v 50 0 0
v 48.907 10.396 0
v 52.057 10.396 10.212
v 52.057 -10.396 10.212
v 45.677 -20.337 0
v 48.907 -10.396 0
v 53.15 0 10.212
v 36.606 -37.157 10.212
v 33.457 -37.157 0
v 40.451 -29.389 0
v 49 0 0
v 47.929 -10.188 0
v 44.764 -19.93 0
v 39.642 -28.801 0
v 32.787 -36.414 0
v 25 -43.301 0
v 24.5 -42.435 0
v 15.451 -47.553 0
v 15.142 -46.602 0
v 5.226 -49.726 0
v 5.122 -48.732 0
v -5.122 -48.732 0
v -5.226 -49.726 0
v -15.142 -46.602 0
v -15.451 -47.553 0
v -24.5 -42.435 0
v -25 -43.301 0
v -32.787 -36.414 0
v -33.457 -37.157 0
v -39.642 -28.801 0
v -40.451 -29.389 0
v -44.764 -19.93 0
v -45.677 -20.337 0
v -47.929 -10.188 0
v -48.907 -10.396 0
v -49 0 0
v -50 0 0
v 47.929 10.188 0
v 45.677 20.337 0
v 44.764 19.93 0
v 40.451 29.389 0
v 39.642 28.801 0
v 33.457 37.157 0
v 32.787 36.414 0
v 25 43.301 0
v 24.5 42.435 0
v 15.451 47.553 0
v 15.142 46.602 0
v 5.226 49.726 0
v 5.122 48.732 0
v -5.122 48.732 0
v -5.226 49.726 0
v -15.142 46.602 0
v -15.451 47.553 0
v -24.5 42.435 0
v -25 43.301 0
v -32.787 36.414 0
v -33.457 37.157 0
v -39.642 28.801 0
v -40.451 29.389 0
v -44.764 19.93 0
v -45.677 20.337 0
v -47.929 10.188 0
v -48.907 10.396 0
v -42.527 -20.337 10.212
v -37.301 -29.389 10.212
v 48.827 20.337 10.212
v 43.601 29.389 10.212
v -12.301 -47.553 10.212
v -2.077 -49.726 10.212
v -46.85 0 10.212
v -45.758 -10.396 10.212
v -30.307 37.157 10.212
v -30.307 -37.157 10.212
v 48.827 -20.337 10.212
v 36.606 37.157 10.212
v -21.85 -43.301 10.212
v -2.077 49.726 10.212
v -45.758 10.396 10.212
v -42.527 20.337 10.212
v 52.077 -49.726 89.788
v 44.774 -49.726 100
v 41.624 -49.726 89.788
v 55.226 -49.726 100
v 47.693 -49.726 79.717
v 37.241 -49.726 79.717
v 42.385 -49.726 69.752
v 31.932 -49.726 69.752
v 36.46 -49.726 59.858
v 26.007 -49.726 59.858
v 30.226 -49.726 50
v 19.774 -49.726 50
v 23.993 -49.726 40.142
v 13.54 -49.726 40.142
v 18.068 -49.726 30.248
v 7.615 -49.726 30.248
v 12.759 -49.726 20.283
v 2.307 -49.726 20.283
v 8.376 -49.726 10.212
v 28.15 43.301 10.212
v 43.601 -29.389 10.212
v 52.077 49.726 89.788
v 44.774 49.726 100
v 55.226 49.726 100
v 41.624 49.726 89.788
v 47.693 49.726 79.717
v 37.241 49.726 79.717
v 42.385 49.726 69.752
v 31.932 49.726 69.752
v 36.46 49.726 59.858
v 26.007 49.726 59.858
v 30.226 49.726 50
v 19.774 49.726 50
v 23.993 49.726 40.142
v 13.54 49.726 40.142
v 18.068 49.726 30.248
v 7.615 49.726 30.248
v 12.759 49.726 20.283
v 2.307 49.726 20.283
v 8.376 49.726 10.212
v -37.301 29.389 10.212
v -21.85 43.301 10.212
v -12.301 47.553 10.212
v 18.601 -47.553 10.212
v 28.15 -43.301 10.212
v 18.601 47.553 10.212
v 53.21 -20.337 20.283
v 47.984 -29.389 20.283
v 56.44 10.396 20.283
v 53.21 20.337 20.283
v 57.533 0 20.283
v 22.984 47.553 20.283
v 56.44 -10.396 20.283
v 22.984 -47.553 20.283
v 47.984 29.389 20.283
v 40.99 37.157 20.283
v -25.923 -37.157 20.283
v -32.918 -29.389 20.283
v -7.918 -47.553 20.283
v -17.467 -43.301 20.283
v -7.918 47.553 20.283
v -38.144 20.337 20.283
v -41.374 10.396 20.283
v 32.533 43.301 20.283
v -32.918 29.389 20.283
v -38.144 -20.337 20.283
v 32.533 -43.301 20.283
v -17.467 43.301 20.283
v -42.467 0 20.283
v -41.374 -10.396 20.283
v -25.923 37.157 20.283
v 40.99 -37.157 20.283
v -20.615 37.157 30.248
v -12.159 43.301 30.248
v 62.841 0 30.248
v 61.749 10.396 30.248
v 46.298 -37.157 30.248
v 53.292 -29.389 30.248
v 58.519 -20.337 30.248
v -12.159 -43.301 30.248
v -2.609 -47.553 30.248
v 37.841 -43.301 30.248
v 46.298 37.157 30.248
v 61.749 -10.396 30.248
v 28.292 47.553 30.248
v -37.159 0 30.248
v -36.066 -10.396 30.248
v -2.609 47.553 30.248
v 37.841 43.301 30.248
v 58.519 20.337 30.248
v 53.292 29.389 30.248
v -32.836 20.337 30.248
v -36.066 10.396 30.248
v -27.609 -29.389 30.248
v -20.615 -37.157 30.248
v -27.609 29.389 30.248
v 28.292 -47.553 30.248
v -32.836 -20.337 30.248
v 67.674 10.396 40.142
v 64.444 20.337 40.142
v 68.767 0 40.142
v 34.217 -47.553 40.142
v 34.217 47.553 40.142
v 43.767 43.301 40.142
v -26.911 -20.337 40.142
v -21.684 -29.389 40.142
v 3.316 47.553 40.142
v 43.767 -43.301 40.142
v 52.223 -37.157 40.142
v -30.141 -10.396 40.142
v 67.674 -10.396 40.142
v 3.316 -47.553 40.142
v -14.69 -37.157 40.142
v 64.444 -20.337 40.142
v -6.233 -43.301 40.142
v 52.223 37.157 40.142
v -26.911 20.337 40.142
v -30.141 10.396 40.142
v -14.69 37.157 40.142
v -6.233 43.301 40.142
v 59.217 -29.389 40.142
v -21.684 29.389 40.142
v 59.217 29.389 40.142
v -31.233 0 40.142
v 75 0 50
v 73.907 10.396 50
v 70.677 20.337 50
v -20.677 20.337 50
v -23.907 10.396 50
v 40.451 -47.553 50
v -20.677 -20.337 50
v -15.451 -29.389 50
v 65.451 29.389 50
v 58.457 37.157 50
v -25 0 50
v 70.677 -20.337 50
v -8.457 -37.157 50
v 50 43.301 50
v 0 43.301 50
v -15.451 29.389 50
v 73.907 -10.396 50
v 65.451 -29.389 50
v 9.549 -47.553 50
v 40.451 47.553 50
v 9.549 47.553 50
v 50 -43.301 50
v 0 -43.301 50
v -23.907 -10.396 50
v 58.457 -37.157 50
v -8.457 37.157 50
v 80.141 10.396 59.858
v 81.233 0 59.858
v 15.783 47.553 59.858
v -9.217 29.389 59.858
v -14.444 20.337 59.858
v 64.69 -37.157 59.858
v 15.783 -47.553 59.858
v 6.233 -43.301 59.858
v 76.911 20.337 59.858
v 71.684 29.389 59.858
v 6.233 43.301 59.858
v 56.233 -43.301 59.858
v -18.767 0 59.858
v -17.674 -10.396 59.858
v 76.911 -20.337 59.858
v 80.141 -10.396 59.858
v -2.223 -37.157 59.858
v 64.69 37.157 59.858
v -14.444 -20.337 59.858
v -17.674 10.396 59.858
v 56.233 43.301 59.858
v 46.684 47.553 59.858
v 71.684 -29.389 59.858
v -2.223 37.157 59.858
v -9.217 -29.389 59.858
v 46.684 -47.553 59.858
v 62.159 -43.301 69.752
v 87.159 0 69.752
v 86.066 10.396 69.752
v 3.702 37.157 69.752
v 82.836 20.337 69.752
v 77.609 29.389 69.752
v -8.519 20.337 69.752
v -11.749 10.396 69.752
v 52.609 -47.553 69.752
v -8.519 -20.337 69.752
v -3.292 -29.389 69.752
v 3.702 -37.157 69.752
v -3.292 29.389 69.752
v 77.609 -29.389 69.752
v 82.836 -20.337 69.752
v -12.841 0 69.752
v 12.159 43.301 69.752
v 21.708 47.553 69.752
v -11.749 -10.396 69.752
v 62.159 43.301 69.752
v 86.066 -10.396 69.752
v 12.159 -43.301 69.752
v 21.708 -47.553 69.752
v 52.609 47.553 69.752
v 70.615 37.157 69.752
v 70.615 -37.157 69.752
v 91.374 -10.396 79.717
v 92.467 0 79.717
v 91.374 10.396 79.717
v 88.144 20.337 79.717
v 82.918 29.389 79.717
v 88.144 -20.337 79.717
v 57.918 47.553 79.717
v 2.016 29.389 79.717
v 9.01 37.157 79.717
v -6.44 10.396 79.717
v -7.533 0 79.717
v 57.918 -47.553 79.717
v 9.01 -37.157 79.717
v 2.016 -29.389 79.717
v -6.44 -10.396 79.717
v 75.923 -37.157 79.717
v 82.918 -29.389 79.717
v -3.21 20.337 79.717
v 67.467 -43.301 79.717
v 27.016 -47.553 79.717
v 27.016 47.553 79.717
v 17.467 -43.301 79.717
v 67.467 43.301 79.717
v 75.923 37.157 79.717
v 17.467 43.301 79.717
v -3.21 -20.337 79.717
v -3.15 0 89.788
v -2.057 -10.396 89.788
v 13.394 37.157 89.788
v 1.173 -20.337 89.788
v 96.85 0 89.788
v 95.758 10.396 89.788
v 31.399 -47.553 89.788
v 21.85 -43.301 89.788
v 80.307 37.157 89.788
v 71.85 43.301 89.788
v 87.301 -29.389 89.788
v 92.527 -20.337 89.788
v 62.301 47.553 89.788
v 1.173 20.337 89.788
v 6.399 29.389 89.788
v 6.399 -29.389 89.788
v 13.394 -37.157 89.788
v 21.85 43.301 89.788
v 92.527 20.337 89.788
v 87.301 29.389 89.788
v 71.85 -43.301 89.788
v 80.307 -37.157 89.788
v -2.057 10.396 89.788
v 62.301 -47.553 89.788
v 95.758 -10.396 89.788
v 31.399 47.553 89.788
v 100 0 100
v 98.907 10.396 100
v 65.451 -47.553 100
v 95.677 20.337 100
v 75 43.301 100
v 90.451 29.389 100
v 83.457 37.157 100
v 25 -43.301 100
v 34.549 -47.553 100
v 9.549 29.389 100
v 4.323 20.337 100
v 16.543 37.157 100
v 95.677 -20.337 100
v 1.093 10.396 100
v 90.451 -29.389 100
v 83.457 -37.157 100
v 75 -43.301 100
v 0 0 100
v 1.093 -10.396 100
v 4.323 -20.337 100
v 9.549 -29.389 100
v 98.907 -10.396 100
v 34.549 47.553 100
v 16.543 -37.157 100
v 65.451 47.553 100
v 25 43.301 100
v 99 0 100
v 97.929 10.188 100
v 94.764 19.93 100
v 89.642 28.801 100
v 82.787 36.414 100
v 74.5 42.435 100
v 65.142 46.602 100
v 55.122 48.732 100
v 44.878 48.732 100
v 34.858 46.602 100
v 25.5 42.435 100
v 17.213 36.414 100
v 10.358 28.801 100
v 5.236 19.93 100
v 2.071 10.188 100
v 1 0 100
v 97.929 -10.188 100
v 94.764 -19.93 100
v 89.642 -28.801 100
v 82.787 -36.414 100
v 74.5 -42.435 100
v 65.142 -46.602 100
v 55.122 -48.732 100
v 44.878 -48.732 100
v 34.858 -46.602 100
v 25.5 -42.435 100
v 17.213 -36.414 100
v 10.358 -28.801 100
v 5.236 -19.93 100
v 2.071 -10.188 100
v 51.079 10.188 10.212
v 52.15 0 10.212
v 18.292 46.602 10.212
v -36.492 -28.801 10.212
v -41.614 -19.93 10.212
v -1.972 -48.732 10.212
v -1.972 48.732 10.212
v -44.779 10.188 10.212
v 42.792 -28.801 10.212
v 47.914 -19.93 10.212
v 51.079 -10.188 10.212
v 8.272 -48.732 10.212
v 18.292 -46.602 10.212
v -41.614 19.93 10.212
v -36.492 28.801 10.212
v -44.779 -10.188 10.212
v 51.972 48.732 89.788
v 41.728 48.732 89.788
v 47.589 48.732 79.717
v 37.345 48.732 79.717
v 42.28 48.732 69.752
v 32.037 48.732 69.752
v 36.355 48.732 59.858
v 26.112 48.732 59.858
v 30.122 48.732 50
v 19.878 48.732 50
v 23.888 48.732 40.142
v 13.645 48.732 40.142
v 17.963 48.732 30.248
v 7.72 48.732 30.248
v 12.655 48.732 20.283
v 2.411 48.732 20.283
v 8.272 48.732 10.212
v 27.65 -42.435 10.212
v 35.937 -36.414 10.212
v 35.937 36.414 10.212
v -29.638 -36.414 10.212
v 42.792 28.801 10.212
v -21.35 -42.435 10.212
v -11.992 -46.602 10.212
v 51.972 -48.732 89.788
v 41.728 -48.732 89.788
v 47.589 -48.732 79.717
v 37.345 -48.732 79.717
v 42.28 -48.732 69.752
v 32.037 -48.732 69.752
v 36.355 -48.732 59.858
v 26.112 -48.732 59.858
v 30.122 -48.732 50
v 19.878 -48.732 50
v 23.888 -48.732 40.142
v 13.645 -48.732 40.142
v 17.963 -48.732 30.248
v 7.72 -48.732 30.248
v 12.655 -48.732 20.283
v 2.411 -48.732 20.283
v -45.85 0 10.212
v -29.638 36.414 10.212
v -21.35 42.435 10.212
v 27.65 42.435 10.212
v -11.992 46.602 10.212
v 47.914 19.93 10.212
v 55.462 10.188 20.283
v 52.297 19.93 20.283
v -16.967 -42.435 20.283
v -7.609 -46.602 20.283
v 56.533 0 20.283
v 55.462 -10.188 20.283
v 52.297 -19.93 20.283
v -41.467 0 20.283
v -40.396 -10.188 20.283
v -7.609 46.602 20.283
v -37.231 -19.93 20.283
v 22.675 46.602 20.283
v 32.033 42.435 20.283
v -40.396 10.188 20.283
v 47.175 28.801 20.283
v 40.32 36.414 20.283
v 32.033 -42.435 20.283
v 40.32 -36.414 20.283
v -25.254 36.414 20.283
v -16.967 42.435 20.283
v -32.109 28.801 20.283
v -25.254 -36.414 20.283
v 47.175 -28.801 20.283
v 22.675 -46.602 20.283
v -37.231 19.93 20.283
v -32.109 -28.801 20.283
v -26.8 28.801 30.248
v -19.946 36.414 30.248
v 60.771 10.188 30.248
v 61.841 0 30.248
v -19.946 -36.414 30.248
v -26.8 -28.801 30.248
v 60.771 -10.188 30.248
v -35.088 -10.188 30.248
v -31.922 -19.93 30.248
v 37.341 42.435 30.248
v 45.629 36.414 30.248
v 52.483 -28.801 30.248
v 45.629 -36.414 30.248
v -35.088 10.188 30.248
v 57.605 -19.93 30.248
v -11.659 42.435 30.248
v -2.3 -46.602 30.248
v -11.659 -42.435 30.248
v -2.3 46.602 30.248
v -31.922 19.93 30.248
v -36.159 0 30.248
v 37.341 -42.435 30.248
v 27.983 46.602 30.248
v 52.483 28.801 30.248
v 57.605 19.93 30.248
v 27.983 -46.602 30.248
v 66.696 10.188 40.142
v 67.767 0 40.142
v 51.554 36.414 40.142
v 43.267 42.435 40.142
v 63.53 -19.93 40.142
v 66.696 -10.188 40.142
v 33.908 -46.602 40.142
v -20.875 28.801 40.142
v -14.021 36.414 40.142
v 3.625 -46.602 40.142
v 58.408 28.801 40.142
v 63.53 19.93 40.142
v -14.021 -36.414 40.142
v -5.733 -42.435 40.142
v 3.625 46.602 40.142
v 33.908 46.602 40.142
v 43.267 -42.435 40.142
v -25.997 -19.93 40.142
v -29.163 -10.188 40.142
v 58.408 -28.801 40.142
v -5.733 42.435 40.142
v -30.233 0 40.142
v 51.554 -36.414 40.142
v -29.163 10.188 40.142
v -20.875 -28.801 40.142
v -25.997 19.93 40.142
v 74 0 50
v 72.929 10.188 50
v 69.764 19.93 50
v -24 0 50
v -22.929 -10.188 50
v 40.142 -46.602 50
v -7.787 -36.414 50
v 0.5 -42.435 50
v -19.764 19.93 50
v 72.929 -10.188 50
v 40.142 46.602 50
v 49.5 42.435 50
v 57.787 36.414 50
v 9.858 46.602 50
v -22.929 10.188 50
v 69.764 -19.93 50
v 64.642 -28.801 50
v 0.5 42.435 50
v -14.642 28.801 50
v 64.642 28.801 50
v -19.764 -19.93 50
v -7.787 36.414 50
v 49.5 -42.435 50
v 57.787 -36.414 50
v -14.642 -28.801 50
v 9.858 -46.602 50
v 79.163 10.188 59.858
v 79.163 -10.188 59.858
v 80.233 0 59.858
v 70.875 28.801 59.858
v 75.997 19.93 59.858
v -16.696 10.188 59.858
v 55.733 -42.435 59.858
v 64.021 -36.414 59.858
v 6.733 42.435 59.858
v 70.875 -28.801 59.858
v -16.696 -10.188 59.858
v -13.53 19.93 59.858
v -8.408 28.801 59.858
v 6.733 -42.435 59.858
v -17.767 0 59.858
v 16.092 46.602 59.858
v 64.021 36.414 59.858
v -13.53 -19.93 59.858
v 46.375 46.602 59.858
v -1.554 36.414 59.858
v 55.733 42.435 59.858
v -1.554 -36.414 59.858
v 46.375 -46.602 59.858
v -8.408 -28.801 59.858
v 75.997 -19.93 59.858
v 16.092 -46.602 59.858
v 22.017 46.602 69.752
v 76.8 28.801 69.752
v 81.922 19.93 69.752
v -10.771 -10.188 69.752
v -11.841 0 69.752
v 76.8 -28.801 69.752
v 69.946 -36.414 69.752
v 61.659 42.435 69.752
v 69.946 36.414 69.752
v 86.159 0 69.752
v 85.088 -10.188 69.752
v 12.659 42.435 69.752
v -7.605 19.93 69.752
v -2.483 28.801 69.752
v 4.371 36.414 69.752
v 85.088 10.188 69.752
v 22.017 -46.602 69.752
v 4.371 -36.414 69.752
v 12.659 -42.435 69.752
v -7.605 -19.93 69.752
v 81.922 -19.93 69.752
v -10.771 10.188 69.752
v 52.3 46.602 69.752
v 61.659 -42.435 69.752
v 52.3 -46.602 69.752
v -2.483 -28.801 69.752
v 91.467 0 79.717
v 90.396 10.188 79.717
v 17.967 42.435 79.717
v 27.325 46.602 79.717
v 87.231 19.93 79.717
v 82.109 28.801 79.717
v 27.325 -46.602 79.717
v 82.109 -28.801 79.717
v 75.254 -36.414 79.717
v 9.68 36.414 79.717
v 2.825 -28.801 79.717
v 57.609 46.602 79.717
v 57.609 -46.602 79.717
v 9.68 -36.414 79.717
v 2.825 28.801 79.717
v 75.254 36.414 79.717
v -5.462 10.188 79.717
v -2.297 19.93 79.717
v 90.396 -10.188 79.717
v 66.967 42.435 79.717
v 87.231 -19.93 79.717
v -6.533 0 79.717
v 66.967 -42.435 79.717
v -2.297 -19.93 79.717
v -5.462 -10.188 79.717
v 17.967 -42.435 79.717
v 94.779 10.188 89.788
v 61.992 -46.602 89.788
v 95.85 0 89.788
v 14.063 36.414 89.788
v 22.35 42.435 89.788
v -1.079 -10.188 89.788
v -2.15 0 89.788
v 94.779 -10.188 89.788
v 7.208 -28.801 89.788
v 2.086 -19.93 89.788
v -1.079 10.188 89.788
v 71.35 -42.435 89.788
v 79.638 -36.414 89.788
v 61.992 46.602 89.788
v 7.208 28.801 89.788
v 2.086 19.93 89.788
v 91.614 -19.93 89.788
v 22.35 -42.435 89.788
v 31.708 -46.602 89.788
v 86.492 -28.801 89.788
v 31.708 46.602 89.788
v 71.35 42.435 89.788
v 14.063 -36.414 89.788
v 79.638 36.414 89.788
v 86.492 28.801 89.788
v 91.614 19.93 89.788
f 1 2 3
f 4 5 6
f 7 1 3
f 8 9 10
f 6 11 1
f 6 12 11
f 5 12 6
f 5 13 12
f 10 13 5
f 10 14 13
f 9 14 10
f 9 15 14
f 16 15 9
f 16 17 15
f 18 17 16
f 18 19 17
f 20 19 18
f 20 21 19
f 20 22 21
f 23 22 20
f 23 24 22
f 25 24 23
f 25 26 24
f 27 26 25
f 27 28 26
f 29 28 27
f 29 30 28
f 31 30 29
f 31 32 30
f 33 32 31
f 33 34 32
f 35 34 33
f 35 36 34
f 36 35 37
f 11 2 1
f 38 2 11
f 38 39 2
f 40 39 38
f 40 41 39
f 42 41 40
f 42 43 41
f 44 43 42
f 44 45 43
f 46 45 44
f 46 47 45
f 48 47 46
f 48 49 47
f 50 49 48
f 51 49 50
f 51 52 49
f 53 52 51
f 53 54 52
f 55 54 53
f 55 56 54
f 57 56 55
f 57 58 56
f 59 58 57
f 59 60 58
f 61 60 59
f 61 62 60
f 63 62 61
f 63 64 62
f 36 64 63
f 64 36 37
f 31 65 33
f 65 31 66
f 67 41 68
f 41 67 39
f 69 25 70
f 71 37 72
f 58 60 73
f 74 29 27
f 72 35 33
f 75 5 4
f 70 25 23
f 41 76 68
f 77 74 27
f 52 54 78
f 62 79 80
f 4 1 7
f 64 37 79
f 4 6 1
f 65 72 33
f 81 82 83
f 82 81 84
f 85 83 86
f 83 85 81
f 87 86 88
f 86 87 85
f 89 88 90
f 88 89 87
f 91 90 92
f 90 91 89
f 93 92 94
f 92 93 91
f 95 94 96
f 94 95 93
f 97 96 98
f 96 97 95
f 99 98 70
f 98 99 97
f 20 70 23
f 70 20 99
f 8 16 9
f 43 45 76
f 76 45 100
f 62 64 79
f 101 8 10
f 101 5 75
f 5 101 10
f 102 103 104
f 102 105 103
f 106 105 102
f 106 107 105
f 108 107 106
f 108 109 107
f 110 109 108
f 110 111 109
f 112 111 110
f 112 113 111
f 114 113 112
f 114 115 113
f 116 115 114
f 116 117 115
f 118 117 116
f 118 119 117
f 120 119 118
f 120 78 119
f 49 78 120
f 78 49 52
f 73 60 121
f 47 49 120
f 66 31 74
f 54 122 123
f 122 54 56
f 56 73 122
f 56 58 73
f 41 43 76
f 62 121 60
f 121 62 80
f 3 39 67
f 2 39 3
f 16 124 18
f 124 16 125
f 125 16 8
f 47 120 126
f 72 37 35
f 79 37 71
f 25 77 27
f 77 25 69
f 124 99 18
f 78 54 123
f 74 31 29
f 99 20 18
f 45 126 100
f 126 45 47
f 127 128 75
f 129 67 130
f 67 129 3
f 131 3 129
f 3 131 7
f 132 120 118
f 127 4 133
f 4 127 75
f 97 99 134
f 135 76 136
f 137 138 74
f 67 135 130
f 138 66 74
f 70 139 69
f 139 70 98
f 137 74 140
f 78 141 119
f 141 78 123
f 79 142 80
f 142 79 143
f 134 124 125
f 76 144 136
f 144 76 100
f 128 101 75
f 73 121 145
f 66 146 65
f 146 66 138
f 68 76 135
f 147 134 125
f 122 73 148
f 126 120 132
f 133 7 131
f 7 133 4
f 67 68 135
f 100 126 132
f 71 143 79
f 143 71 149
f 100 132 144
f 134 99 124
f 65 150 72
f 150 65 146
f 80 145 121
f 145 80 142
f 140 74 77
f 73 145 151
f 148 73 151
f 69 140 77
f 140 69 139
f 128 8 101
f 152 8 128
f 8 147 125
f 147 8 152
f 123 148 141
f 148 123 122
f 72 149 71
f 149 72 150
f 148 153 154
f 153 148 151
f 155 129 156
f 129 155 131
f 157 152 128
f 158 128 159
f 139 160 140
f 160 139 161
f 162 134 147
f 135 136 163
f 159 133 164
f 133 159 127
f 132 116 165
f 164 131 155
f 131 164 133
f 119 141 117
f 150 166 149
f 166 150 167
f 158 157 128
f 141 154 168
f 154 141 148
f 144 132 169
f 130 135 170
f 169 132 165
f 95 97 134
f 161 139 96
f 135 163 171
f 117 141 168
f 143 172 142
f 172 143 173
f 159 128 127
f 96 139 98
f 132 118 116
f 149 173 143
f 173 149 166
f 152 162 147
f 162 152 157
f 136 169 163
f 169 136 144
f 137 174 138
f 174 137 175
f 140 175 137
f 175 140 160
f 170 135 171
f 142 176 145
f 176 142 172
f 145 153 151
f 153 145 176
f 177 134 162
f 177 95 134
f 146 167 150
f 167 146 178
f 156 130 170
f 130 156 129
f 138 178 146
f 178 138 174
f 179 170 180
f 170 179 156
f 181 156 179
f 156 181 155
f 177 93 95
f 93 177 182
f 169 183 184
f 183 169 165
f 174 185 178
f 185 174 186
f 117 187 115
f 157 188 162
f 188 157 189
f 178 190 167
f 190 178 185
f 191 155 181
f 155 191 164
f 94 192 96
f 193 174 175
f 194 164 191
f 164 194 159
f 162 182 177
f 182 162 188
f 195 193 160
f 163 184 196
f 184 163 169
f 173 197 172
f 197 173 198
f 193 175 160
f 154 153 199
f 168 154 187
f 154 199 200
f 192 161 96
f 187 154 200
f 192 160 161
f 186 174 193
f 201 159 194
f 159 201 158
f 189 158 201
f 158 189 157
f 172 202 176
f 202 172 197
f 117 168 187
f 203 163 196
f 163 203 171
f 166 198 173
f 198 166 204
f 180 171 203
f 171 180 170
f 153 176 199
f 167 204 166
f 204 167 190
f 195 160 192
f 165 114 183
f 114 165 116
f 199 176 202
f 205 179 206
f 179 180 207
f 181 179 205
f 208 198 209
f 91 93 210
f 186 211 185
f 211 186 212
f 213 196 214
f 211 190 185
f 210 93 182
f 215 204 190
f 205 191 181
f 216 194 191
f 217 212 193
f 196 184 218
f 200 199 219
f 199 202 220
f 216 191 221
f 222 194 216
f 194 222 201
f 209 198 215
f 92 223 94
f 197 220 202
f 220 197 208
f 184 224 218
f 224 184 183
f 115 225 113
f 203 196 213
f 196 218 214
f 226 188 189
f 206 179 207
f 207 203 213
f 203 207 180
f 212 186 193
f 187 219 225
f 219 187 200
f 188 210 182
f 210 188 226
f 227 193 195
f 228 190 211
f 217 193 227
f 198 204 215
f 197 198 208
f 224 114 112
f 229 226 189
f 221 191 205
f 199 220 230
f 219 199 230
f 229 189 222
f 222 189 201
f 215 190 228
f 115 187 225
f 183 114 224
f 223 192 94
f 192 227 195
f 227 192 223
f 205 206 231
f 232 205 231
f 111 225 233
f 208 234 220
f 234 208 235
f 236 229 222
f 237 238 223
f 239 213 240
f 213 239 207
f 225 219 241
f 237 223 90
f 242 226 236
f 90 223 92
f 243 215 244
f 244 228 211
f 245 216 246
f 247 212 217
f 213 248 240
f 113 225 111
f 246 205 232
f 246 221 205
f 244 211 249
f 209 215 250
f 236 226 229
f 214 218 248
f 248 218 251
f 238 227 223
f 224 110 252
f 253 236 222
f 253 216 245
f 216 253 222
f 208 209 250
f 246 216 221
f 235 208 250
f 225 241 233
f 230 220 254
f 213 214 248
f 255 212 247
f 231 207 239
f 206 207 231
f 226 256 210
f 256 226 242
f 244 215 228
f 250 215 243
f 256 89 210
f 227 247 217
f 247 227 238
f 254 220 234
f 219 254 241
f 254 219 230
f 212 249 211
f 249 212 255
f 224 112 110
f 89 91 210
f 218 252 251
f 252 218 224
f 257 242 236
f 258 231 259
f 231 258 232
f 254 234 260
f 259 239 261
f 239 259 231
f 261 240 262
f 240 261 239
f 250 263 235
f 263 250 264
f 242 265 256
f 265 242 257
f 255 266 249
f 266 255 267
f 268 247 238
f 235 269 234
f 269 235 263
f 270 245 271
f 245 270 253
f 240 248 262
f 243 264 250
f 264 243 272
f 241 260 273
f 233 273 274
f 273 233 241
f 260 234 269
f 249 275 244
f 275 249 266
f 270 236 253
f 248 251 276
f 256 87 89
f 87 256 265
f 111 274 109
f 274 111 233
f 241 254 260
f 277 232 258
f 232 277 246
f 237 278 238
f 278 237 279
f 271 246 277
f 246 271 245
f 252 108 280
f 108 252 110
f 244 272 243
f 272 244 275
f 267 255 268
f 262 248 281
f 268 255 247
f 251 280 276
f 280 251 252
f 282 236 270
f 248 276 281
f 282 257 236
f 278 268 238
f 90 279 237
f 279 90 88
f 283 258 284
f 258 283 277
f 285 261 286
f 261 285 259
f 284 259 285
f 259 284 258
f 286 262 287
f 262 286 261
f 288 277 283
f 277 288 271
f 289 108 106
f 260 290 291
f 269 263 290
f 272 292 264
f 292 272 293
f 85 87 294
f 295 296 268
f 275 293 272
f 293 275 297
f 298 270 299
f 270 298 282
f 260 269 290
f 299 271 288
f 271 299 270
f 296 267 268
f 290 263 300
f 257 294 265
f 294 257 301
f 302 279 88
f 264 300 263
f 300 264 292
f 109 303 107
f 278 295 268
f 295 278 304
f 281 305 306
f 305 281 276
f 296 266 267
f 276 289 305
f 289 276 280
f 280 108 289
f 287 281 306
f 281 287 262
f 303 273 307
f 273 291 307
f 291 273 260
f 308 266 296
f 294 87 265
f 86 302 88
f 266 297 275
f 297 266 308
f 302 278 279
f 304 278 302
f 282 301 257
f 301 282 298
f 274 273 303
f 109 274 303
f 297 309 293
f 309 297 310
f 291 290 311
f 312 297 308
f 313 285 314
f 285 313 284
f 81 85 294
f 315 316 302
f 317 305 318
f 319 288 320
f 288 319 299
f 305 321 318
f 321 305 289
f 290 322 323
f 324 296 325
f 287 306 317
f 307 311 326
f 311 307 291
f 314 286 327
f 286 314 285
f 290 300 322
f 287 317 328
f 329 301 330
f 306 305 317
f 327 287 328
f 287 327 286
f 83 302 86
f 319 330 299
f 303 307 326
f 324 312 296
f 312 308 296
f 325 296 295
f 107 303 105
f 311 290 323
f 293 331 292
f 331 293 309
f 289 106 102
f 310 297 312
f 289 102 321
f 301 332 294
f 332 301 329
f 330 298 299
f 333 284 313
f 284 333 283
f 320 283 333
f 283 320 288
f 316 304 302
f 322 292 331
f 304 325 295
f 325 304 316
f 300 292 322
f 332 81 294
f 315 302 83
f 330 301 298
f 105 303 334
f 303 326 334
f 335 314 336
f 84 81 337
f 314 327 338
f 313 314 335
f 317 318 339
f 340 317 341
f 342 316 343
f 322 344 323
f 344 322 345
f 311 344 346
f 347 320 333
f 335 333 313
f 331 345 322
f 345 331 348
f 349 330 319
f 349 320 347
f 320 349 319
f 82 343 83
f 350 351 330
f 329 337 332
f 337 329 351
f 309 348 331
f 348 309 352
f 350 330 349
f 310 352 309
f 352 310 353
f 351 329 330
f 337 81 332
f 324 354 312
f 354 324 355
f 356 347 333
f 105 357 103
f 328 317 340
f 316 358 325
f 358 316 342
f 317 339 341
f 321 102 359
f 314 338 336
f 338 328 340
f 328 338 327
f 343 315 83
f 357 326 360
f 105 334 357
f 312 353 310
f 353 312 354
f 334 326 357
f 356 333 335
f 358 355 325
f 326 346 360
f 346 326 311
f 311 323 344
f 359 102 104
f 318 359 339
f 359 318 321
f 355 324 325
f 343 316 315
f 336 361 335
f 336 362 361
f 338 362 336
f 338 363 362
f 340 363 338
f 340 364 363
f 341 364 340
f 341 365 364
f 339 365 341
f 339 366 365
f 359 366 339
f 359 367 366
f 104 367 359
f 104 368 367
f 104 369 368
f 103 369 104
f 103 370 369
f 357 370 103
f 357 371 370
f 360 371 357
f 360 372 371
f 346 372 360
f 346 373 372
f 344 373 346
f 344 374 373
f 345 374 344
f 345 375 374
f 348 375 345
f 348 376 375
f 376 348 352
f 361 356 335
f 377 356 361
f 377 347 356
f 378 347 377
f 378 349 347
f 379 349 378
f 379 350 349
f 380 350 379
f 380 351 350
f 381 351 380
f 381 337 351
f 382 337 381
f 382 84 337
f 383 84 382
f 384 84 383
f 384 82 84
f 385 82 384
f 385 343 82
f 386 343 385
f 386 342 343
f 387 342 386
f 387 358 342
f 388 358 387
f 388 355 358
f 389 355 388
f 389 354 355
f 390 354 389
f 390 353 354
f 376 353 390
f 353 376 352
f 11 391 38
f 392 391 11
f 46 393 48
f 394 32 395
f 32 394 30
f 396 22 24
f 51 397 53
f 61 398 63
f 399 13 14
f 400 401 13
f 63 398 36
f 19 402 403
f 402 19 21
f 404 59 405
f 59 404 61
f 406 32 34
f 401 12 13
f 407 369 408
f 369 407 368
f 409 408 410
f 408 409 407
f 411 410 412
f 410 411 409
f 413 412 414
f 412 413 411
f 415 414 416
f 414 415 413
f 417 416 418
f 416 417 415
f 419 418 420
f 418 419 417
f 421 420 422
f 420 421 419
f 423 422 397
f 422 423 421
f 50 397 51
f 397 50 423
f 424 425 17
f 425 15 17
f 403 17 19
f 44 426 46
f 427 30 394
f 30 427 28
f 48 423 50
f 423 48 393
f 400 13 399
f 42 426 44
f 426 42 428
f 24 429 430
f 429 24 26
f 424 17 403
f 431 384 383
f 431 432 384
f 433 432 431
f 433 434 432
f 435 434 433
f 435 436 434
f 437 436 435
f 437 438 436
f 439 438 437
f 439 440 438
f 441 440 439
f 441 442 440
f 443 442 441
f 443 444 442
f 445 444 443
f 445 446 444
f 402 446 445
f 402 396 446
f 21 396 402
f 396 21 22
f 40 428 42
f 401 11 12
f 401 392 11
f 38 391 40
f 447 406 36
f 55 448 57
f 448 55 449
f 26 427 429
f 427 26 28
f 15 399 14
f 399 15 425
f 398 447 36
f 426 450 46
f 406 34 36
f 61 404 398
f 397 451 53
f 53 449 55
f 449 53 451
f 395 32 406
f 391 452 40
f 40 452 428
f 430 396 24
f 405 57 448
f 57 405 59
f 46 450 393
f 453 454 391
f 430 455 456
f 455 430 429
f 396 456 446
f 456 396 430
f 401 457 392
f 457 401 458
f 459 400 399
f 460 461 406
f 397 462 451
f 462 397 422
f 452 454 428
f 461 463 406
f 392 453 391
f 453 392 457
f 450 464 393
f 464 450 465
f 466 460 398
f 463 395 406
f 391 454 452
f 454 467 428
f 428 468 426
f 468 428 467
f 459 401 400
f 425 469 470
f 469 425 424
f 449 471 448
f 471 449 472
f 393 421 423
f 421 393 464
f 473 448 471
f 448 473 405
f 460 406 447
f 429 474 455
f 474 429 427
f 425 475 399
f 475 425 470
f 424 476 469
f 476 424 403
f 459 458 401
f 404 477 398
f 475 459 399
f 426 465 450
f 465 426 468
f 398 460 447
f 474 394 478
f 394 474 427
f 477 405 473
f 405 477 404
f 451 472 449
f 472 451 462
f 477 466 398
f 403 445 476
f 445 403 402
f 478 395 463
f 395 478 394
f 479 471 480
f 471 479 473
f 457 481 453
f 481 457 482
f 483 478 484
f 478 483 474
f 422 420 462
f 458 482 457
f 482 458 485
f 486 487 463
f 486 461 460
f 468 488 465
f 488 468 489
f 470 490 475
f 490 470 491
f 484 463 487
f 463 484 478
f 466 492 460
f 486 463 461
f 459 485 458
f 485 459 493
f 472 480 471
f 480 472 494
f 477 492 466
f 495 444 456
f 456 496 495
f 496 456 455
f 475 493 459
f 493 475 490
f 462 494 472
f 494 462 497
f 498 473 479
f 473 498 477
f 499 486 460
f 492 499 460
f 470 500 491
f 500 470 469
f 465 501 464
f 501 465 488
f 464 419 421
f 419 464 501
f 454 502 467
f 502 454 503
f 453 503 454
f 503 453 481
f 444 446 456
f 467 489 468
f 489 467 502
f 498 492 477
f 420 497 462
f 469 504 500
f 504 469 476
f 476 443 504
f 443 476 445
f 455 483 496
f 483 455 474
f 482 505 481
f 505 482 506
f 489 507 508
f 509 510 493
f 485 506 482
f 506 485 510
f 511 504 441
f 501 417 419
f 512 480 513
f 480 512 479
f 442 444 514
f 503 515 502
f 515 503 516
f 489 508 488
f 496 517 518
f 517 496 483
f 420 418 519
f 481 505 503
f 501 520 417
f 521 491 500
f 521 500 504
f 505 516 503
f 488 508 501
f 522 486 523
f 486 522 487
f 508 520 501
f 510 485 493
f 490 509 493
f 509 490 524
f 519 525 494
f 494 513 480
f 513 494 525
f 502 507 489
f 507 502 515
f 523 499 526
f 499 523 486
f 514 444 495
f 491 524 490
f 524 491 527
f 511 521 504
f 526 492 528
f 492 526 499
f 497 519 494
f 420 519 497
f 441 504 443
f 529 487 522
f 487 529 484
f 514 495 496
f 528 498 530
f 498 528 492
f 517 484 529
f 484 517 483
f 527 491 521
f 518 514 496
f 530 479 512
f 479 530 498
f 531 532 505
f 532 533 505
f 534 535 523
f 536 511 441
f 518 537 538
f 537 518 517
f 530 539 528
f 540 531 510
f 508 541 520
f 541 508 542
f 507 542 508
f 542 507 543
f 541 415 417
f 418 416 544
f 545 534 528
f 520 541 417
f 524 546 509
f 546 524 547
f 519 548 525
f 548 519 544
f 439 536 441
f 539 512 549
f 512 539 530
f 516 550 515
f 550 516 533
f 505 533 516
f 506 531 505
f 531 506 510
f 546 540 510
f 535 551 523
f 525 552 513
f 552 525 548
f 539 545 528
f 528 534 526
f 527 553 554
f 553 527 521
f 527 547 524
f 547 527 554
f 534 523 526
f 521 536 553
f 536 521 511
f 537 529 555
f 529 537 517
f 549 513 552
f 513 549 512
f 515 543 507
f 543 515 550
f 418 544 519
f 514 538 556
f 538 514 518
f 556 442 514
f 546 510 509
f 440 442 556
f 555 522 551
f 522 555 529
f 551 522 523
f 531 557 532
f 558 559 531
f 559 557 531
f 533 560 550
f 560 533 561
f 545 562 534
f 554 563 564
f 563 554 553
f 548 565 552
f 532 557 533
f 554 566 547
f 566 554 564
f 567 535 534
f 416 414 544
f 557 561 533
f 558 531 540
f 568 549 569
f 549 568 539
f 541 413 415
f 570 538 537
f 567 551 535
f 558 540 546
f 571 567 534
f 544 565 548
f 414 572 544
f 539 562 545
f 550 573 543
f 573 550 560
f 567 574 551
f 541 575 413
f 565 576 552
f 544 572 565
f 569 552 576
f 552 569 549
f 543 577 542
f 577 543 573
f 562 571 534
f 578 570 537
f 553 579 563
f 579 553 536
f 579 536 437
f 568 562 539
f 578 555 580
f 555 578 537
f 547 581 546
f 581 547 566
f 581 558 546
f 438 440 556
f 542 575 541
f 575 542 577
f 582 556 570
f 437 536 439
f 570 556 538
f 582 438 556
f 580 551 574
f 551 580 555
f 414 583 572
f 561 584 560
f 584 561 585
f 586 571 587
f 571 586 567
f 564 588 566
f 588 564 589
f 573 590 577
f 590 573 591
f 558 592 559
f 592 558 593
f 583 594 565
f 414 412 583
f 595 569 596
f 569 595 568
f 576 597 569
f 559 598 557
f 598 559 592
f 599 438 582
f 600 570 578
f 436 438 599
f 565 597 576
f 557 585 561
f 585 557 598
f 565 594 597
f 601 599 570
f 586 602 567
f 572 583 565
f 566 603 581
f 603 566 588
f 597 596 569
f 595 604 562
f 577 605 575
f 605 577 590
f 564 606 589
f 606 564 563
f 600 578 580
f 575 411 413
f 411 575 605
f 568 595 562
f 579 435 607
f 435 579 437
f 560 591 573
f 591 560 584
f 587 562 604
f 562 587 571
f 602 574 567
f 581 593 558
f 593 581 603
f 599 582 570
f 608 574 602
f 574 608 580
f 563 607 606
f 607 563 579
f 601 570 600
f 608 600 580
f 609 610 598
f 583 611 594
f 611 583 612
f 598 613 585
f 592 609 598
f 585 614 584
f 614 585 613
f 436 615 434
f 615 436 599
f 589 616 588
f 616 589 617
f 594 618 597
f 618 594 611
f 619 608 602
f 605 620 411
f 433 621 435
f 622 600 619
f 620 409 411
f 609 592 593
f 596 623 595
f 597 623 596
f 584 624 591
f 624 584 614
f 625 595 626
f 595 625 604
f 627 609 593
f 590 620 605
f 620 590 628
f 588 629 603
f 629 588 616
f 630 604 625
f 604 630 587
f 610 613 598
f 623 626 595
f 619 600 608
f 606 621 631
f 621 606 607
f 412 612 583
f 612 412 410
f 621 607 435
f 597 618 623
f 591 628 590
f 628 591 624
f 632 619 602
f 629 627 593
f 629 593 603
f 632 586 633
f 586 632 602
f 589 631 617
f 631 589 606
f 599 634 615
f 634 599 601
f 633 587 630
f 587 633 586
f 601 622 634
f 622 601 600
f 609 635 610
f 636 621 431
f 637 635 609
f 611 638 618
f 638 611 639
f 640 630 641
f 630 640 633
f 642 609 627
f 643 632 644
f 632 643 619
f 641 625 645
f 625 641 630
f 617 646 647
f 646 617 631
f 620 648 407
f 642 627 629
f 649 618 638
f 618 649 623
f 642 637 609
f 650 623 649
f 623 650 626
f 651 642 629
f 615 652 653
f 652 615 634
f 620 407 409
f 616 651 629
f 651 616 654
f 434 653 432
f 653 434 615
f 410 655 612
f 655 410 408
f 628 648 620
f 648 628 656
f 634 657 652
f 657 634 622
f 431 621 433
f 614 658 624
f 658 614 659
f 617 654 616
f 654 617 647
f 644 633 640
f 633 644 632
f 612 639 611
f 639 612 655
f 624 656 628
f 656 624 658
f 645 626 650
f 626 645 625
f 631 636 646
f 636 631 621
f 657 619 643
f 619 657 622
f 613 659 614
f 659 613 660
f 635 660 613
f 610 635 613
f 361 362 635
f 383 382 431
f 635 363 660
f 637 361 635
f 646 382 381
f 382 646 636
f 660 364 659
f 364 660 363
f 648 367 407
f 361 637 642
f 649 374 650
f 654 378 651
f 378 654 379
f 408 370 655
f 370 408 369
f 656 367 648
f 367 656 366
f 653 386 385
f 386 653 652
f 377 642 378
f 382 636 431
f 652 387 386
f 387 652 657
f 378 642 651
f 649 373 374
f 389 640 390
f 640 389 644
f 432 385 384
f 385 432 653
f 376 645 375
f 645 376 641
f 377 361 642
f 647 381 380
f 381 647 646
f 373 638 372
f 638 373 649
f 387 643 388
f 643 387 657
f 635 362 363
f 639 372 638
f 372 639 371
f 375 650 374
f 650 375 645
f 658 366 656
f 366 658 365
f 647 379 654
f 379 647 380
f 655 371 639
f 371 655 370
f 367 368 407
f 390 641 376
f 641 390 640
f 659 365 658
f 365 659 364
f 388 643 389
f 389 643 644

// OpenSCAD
// file: catmullrom.scad
/*
Centripetal Catmull–Rom spline fashioned after
https://en.wikipedia.org/wiki/Centripetal_Catmull%E2%80%93Rom_spline#Code_example_in_Python
*/

function tj(ti, Pi, Pj, alpha) =
    pow(pow(Pj[0]-Pi[0], 2) + pow(Pj[1]-Pi[1], 2), alpha / 2) + ti;

function c(P0, P1, P2, P3, t0, t1, t2, t3, t) =
    let(
        a1=(t1-t)/(t1-t0)*P0 + (t-t0)/(t1-t0)*P1,
        a2=(t2-t)/(t2-t1)*P1 + (t-t1)/(t2-t1)*P2,
        a3=(t3-t)/(t3-t2)*P2 + (t-t2)/(t3-t2)*P3,
        b1=(t2-t)/(t2-t0)*a1 + (t-t0)/(t2-t0)*a2,
        b2=(t3-t)/(t3-t1)*a2 + (t-t1)/(t3-t1)*a3
    )
    (t2-t)/(t2-t1)*b1 + (t-t1)/(t2-t1)*b2;

function range(a, b, n) = [for (x=[0:n]) x / n * (b - a) + a];

function spline_segment(P0, P1, P2, P3, n, alpha) =
    let(
        t0=0,
        t1=tj(t0, P0, P1, alpha),
        t2=tj(t1, P1, P2, alpha),
        t3=tj(t2, P2, P3, alpha)
    )
    [for(t=range(t1, t2, n)) c(P0, P1, P2, P3, t0, t1 ,t2, t3, t)];

function spline(P, n, alpha=0.5) =
    [for (i=[0:len(P)-4]) for(s=spline_segment(P[i], P[i+1], P[i+2], P[i+3], n, alpha)) s];
// file: parallel_tube.scad
/*
A tube with parallel openings following a spline
*/
use <catmullrom.scad>;

module parallel_tube_points(xz, d) {
    union() {
        for (i=[0:len(xz)-2]) {
            x0 = xz[i][0];
            z0 = xz[i][1];
            x1 = xz[i+1][0];
            z1 = xz[i+1][1];
            
            dz = z1 - z0;
            dx = x1 - x0;
            
            translate([x0, 0, z0])
                multmatrix(m=[
                    [1, 0, dx/dz, 0],
                    [0, 1, 0, 0],
                    [0, 0, 1, 0]
                ])
                    cylinder(d=d, h=dz);           
        }
    }
}

module parallel_tube(P, n, d) {
    xz = spline(P, n);
    parallel_tube_points(xz, d);
}
// main file
use <parallel_tube.scad>;

shift = 50;
height = 100;
start = height;
P = [[0, -start],
     [0, 0],
     [shift, height],
     [shift, height + start]
    ];
n = 10;
tube_diameter = 100;
tube_thickness = 2;

difference() {
    parallel_tube(P, n, tube_diameter);
    parallel_tube(P, n, tube_diameter - tube_thickness);
}
